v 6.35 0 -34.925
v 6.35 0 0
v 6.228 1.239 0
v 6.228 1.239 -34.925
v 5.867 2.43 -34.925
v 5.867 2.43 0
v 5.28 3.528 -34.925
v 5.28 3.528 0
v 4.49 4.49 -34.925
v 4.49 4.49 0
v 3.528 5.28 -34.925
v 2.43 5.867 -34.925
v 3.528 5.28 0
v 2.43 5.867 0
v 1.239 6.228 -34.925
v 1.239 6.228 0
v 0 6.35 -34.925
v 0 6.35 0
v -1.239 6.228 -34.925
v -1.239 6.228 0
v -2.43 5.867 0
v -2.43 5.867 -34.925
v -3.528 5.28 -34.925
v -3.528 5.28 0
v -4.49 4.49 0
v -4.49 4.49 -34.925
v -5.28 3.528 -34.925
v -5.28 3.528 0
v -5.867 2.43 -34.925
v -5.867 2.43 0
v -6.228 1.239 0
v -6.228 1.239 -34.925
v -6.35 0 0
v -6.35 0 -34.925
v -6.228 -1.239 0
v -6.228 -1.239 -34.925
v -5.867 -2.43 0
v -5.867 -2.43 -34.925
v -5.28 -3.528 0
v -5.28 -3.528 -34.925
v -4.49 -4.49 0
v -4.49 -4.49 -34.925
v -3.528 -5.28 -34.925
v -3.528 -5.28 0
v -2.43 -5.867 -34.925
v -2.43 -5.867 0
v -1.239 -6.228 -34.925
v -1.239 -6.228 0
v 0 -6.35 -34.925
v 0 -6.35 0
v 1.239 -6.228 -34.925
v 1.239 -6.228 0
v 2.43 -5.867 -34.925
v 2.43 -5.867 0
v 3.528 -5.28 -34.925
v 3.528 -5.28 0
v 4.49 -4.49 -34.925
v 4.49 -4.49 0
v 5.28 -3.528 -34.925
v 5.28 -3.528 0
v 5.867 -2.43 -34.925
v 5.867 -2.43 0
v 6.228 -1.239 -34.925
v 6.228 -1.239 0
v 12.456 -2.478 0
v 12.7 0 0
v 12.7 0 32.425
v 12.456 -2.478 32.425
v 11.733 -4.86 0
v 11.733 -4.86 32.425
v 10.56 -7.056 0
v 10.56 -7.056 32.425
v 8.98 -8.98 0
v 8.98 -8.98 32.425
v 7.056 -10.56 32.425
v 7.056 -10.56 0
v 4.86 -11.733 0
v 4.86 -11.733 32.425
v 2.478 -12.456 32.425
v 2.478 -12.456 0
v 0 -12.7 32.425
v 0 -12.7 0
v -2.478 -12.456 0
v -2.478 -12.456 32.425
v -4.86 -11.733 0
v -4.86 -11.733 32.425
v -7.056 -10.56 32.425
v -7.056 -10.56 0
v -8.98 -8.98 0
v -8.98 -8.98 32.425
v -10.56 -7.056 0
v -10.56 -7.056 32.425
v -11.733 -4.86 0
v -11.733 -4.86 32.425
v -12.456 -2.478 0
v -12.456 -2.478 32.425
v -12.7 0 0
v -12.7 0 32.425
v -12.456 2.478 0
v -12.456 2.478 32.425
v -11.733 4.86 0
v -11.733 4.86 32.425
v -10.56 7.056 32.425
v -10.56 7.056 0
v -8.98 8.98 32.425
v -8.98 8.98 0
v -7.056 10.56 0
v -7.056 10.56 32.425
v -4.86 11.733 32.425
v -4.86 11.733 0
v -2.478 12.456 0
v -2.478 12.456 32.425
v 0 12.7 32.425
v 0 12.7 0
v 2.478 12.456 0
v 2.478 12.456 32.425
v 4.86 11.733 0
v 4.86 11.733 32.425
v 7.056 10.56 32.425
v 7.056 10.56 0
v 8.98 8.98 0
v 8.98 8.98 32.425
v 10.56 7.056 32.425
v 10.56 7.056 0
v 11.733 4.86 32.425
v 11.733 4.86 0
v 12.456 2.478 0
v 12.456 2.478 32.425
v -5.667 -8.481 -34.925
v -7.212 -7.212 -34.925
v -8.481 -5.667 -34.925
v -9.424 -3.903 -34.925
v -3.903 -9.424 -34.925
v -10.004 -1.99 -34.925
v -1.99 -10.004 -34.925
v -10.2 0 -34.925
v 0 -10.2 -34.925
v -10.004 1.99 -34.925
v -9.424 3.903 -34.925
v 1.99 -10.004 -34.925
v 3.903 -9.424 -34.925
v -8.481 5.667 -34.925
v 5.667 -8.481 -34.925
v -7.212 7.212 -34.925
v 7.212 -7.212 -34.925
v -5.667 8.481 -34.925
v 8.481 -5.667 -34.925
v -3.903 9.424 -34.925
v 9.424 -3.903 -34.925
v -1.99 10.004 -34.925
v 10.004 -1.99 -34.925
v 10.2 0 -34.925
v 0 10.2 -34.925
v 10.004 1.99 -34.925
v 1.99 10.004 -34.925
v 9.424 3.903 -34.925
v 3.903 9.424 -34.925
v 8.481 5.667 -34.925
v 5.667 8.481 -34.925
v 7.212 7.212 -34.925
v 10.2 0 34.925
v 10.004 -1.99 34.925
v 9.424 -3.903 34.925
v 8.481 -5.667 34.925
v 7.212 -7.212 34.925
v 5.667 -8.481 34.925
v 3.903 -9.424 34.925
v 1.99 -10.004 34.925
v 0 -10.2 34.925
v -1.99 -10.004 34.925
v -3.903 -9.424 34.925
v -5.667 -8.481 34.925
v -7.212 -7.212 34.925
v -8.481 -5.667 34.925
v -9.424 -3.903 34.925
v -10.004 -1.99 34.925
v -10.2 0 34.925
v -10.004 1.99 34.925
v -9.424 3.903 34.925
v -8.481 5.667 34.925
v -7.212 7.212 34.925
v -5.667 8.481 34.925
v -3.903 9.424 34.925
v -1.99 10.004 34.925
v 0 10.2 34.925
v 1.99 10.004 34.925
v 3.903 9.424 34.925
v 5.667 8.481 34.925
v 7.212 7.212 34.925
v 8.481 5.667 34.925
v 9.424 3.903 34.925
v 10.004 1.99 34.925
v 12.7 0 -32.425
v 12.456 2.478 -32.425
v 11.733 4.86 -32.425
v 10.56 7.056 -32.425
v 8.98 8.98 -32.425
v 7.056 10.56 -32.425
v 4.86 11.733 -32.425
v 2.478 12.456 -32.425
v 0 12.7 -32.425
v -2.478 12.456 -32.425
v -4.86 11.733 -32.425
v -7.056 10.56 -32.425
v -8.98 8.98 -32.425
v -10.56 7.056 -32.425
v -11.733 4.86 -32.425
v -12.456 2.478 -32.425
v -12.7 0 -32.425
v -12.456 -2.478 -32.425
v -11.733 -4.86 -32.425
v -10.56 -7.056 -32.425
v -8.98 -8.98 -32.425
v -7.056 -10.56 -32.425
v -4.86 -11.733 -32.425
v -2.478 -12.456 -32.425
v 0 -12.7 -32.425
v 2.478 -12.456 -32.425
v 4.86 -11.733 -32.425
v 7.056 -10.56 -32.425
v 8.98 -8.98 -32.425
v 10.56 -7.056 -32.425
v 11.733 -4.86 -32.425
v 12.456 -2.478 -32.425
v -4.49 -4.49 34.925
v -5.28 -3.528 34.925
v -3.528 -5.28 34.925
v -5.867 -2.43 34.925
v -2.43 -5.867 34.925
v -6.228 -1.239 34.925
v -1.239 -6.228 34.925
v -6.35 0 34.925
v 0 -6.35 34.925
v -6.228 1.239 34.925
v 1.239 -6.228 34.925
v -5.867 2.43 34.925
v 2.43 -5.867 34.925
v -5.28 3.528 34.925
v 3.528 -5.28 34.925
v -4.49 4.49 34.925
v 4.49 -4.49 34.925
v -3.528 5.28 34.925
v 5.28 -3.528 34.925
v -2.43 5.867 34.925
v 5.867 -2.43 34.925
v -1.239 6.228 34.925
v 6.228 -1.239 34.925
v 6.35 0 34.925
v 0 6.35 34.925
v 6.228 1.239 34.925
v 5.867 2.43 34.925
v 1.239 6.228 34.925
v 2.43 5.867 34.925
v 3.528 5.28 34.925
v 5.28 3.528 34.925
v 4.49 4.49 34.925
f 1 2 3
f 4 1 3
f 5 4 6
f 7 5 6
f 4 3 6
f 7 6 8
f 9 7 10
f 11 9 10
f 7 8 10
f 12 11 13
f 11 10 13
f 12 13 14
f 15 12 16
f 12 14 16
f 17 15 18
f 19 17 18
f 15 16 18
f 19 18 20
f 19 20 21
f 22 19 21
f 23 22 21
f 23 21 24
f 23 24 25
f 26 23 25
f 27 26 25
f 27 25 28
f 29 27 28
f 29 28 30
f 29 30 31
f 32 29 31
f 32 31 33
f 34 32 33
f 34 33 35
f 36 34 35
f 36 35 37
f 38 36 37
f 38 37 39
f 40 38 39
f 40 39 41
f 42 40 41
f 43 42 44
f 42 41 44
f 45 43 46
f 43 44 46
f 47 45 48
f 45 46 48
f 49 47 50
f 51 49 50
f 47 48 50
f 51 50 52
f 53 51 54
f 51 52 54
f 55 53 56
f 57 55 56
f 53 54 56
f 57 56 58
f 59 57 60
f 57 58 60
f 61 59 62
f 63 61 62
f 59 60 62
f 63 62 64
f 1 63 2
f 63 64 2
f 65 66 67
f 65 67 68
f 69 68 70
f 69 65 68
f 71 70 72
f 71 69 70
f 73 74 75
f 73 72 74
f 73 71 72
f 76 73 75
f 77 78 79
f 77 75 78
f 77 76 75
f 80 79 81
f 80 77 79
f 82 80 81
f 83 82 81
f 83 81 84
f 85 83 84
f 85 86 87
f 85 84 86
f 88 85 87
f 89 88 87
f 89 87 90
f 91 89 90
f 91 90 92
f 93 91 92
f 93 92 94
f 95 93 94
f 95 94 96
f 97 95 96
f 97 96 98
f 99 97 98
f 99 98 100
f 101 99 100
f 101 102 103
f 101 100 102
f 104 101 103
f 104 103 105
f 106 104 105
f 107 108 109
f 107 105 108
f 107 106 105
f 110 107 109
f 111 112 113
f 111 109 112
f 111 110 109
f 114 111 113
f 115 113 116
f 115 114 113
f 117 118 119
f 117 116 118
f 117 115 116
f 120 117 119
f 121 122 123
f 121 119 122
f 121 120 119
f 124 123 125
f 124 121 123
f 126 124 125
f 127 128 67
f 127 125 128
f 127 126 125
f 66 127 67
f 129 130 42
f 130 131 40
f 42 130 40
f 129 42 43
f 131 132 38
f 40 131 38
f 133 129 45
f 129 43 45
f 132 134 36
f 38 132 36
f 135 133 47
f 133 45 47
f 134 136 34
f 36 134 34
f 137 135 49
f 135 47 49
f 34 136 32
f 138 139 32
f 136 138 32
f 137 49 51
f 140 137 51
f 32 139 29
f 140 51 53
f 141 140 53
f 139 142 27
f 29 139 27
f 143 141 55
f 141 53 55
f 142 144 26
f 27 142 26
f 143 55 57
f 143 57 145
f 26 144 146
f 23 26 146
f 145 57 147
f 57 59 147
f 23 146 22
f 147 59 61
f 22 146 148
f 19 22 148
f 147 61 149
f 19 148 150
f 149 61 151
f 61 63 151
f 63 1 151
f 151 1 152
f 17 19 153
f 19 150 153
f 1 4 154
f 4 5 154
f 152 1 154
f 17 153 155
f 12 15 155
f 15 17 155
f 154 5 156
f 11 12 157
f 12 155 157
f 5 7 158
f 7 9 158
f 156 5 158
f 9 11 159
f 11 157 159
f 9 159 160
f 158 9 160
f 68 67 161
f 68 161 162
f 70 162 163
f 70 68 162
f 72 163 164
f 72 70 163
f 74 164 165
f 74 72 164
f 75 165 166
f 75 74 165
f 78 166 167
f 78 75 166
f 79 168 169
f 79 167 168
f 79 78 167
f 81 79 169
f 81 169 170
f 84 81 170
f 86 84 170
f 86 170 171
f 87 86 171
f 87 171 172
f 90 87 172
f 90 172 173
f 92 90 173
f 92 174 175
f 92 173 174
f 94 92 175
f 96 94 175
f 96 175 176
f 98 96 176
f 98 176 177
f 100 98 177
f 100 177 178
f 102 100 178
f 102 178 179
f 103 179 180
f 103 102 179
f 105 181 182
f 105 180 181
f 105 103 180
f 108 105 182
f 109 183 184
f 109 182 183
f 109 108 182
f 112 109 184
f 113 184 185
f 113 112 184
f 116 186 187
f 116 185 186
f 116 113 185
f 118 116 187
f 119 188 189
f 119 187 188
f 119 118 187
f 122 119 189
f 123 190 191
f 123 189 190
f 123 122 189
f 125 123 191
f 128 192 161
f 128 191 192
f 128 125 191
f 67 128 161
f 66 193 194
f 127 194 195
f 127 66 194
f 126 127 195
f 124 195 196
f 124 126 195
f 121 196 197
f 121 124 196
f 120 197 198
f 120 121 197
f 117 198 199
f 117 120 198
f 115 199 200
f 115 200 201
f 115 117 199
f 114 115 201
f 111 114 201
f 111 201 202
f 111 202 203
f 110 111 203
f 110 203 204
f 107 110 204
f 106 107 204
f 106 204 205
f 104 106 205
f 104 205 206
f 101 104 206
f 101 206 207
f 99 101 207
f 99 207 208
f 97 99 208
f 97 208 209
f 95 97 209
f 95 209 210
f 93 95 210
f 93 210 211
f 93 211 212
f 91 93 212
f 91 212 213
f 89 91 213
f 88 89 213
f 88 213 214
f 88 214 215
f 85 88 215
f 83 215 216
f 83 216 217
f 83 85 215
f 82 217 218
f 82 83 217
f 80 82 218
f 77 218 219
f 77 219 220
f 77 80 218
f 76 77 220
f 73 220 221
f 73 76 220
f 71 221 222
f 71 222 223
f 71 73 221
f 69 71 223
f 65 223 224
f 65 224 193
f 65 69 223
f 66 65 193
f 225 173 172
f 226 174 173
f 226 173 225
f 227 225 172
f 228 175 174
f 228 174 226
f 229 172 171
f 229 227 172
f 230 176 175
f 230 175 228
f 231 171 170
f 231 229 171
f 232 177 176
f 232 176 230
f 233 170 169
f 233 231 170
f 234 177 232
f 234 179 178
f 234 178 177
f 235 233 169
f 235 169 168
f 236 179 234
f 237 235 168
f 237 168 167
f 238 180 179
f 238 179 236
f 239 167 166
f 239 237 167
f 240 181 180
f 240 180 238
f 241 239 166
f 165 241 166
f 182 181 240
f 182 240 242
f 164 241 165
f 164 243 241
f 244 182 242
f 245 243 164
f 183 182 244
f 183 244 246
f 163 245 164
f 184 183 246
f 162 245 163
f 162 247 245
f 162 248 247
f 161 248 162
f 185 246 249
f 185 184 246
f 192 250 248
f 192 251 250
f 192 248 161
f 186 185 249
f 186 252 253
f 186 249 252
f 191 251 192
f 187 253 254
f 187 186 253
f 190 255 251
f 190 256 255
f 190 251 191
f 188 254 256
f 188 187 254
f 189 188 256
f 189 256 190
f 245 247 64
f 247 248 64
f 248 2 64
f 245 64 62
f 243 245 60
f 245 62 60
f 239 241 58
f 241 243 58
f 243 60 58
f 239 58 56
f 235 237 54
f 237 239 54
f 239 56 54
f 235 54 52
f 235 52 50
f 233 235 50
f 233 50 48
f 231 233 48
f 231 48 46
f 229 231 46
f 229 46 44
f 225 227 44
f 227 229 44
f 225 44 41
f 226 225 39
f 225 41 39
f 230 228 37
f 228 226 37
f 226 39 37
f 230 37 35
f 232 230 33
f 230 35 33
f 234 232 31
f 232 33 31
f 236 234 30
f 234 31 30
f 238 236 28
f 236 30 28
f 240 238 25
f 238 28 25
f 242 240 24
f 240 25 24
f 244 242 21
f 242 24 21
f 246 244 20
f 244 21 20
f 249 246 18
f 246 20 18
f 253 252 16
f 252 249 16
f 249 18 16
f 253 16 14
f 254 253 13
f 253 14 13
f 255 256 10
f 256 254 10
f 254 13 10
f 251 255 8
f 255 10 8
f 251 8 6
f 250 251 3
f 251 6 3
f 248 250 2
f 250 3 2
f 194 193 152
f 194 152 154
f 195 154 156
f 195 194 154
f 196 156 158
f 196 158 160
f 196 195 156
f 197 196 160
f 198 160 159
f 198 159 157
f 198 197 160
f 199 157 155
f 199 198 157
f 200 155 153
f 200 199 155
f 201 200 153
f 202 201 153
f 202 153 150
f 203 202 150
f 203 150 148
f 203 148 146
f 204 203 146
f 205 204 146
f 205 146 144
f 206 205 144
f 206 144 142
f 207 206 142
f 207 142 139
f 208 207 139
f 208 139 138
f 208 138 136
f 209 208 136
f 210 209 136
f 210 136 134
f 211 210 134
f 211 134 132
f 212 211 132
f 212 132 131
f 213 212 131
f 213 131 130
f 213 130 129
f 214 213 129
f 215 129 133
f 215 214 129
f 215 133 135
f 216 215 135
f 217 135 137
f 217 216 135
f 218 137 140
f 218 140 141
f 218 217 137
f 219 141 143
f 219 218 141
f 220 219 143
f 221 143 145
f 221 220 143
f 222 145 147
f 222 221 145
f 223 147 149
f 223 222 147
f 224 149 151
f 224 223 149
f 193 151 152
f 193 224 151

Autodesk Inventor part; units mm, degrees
ref_plane "YZ Plane" through (0, 0, 0) normal (1, 0, 0) x (0, 1, 0)
ref_plane "XZ Plane" through (0, 0, 0) normal (0, 1, 0) x (-1, 0, 0)
ref_plane "XY Plane" through (0, 0, 0) normal (0, 0, 1) x (1, 0, 0)
sketch "Sketch1" plane through (0, 0, 0) normal (0, 0, 1) x (1, 0, 0)
  circle A0 centre (0, 0) radius 6.35
  circle A1 centre (0, 0) radius 12.7
  dimension "d0" = 12.7
  dimension "d1" = 25.4
extrude "Extrusion1" add sketch "Sketch1" along normal mid plane 69.85
chamfer "Chamfer1" distance 2.5 angle 45 1 edges at (-12.7, 0, -34.925) measured on face at (10.3988, -1.5197, -34.925)
chamfer "Chamfer2" distance 2.5 angle 45 1 edges at (-12.7, 0, 34.925) measured on face at (10.3988, -1.5197, 34.925)
properties part number "Piston pin"
